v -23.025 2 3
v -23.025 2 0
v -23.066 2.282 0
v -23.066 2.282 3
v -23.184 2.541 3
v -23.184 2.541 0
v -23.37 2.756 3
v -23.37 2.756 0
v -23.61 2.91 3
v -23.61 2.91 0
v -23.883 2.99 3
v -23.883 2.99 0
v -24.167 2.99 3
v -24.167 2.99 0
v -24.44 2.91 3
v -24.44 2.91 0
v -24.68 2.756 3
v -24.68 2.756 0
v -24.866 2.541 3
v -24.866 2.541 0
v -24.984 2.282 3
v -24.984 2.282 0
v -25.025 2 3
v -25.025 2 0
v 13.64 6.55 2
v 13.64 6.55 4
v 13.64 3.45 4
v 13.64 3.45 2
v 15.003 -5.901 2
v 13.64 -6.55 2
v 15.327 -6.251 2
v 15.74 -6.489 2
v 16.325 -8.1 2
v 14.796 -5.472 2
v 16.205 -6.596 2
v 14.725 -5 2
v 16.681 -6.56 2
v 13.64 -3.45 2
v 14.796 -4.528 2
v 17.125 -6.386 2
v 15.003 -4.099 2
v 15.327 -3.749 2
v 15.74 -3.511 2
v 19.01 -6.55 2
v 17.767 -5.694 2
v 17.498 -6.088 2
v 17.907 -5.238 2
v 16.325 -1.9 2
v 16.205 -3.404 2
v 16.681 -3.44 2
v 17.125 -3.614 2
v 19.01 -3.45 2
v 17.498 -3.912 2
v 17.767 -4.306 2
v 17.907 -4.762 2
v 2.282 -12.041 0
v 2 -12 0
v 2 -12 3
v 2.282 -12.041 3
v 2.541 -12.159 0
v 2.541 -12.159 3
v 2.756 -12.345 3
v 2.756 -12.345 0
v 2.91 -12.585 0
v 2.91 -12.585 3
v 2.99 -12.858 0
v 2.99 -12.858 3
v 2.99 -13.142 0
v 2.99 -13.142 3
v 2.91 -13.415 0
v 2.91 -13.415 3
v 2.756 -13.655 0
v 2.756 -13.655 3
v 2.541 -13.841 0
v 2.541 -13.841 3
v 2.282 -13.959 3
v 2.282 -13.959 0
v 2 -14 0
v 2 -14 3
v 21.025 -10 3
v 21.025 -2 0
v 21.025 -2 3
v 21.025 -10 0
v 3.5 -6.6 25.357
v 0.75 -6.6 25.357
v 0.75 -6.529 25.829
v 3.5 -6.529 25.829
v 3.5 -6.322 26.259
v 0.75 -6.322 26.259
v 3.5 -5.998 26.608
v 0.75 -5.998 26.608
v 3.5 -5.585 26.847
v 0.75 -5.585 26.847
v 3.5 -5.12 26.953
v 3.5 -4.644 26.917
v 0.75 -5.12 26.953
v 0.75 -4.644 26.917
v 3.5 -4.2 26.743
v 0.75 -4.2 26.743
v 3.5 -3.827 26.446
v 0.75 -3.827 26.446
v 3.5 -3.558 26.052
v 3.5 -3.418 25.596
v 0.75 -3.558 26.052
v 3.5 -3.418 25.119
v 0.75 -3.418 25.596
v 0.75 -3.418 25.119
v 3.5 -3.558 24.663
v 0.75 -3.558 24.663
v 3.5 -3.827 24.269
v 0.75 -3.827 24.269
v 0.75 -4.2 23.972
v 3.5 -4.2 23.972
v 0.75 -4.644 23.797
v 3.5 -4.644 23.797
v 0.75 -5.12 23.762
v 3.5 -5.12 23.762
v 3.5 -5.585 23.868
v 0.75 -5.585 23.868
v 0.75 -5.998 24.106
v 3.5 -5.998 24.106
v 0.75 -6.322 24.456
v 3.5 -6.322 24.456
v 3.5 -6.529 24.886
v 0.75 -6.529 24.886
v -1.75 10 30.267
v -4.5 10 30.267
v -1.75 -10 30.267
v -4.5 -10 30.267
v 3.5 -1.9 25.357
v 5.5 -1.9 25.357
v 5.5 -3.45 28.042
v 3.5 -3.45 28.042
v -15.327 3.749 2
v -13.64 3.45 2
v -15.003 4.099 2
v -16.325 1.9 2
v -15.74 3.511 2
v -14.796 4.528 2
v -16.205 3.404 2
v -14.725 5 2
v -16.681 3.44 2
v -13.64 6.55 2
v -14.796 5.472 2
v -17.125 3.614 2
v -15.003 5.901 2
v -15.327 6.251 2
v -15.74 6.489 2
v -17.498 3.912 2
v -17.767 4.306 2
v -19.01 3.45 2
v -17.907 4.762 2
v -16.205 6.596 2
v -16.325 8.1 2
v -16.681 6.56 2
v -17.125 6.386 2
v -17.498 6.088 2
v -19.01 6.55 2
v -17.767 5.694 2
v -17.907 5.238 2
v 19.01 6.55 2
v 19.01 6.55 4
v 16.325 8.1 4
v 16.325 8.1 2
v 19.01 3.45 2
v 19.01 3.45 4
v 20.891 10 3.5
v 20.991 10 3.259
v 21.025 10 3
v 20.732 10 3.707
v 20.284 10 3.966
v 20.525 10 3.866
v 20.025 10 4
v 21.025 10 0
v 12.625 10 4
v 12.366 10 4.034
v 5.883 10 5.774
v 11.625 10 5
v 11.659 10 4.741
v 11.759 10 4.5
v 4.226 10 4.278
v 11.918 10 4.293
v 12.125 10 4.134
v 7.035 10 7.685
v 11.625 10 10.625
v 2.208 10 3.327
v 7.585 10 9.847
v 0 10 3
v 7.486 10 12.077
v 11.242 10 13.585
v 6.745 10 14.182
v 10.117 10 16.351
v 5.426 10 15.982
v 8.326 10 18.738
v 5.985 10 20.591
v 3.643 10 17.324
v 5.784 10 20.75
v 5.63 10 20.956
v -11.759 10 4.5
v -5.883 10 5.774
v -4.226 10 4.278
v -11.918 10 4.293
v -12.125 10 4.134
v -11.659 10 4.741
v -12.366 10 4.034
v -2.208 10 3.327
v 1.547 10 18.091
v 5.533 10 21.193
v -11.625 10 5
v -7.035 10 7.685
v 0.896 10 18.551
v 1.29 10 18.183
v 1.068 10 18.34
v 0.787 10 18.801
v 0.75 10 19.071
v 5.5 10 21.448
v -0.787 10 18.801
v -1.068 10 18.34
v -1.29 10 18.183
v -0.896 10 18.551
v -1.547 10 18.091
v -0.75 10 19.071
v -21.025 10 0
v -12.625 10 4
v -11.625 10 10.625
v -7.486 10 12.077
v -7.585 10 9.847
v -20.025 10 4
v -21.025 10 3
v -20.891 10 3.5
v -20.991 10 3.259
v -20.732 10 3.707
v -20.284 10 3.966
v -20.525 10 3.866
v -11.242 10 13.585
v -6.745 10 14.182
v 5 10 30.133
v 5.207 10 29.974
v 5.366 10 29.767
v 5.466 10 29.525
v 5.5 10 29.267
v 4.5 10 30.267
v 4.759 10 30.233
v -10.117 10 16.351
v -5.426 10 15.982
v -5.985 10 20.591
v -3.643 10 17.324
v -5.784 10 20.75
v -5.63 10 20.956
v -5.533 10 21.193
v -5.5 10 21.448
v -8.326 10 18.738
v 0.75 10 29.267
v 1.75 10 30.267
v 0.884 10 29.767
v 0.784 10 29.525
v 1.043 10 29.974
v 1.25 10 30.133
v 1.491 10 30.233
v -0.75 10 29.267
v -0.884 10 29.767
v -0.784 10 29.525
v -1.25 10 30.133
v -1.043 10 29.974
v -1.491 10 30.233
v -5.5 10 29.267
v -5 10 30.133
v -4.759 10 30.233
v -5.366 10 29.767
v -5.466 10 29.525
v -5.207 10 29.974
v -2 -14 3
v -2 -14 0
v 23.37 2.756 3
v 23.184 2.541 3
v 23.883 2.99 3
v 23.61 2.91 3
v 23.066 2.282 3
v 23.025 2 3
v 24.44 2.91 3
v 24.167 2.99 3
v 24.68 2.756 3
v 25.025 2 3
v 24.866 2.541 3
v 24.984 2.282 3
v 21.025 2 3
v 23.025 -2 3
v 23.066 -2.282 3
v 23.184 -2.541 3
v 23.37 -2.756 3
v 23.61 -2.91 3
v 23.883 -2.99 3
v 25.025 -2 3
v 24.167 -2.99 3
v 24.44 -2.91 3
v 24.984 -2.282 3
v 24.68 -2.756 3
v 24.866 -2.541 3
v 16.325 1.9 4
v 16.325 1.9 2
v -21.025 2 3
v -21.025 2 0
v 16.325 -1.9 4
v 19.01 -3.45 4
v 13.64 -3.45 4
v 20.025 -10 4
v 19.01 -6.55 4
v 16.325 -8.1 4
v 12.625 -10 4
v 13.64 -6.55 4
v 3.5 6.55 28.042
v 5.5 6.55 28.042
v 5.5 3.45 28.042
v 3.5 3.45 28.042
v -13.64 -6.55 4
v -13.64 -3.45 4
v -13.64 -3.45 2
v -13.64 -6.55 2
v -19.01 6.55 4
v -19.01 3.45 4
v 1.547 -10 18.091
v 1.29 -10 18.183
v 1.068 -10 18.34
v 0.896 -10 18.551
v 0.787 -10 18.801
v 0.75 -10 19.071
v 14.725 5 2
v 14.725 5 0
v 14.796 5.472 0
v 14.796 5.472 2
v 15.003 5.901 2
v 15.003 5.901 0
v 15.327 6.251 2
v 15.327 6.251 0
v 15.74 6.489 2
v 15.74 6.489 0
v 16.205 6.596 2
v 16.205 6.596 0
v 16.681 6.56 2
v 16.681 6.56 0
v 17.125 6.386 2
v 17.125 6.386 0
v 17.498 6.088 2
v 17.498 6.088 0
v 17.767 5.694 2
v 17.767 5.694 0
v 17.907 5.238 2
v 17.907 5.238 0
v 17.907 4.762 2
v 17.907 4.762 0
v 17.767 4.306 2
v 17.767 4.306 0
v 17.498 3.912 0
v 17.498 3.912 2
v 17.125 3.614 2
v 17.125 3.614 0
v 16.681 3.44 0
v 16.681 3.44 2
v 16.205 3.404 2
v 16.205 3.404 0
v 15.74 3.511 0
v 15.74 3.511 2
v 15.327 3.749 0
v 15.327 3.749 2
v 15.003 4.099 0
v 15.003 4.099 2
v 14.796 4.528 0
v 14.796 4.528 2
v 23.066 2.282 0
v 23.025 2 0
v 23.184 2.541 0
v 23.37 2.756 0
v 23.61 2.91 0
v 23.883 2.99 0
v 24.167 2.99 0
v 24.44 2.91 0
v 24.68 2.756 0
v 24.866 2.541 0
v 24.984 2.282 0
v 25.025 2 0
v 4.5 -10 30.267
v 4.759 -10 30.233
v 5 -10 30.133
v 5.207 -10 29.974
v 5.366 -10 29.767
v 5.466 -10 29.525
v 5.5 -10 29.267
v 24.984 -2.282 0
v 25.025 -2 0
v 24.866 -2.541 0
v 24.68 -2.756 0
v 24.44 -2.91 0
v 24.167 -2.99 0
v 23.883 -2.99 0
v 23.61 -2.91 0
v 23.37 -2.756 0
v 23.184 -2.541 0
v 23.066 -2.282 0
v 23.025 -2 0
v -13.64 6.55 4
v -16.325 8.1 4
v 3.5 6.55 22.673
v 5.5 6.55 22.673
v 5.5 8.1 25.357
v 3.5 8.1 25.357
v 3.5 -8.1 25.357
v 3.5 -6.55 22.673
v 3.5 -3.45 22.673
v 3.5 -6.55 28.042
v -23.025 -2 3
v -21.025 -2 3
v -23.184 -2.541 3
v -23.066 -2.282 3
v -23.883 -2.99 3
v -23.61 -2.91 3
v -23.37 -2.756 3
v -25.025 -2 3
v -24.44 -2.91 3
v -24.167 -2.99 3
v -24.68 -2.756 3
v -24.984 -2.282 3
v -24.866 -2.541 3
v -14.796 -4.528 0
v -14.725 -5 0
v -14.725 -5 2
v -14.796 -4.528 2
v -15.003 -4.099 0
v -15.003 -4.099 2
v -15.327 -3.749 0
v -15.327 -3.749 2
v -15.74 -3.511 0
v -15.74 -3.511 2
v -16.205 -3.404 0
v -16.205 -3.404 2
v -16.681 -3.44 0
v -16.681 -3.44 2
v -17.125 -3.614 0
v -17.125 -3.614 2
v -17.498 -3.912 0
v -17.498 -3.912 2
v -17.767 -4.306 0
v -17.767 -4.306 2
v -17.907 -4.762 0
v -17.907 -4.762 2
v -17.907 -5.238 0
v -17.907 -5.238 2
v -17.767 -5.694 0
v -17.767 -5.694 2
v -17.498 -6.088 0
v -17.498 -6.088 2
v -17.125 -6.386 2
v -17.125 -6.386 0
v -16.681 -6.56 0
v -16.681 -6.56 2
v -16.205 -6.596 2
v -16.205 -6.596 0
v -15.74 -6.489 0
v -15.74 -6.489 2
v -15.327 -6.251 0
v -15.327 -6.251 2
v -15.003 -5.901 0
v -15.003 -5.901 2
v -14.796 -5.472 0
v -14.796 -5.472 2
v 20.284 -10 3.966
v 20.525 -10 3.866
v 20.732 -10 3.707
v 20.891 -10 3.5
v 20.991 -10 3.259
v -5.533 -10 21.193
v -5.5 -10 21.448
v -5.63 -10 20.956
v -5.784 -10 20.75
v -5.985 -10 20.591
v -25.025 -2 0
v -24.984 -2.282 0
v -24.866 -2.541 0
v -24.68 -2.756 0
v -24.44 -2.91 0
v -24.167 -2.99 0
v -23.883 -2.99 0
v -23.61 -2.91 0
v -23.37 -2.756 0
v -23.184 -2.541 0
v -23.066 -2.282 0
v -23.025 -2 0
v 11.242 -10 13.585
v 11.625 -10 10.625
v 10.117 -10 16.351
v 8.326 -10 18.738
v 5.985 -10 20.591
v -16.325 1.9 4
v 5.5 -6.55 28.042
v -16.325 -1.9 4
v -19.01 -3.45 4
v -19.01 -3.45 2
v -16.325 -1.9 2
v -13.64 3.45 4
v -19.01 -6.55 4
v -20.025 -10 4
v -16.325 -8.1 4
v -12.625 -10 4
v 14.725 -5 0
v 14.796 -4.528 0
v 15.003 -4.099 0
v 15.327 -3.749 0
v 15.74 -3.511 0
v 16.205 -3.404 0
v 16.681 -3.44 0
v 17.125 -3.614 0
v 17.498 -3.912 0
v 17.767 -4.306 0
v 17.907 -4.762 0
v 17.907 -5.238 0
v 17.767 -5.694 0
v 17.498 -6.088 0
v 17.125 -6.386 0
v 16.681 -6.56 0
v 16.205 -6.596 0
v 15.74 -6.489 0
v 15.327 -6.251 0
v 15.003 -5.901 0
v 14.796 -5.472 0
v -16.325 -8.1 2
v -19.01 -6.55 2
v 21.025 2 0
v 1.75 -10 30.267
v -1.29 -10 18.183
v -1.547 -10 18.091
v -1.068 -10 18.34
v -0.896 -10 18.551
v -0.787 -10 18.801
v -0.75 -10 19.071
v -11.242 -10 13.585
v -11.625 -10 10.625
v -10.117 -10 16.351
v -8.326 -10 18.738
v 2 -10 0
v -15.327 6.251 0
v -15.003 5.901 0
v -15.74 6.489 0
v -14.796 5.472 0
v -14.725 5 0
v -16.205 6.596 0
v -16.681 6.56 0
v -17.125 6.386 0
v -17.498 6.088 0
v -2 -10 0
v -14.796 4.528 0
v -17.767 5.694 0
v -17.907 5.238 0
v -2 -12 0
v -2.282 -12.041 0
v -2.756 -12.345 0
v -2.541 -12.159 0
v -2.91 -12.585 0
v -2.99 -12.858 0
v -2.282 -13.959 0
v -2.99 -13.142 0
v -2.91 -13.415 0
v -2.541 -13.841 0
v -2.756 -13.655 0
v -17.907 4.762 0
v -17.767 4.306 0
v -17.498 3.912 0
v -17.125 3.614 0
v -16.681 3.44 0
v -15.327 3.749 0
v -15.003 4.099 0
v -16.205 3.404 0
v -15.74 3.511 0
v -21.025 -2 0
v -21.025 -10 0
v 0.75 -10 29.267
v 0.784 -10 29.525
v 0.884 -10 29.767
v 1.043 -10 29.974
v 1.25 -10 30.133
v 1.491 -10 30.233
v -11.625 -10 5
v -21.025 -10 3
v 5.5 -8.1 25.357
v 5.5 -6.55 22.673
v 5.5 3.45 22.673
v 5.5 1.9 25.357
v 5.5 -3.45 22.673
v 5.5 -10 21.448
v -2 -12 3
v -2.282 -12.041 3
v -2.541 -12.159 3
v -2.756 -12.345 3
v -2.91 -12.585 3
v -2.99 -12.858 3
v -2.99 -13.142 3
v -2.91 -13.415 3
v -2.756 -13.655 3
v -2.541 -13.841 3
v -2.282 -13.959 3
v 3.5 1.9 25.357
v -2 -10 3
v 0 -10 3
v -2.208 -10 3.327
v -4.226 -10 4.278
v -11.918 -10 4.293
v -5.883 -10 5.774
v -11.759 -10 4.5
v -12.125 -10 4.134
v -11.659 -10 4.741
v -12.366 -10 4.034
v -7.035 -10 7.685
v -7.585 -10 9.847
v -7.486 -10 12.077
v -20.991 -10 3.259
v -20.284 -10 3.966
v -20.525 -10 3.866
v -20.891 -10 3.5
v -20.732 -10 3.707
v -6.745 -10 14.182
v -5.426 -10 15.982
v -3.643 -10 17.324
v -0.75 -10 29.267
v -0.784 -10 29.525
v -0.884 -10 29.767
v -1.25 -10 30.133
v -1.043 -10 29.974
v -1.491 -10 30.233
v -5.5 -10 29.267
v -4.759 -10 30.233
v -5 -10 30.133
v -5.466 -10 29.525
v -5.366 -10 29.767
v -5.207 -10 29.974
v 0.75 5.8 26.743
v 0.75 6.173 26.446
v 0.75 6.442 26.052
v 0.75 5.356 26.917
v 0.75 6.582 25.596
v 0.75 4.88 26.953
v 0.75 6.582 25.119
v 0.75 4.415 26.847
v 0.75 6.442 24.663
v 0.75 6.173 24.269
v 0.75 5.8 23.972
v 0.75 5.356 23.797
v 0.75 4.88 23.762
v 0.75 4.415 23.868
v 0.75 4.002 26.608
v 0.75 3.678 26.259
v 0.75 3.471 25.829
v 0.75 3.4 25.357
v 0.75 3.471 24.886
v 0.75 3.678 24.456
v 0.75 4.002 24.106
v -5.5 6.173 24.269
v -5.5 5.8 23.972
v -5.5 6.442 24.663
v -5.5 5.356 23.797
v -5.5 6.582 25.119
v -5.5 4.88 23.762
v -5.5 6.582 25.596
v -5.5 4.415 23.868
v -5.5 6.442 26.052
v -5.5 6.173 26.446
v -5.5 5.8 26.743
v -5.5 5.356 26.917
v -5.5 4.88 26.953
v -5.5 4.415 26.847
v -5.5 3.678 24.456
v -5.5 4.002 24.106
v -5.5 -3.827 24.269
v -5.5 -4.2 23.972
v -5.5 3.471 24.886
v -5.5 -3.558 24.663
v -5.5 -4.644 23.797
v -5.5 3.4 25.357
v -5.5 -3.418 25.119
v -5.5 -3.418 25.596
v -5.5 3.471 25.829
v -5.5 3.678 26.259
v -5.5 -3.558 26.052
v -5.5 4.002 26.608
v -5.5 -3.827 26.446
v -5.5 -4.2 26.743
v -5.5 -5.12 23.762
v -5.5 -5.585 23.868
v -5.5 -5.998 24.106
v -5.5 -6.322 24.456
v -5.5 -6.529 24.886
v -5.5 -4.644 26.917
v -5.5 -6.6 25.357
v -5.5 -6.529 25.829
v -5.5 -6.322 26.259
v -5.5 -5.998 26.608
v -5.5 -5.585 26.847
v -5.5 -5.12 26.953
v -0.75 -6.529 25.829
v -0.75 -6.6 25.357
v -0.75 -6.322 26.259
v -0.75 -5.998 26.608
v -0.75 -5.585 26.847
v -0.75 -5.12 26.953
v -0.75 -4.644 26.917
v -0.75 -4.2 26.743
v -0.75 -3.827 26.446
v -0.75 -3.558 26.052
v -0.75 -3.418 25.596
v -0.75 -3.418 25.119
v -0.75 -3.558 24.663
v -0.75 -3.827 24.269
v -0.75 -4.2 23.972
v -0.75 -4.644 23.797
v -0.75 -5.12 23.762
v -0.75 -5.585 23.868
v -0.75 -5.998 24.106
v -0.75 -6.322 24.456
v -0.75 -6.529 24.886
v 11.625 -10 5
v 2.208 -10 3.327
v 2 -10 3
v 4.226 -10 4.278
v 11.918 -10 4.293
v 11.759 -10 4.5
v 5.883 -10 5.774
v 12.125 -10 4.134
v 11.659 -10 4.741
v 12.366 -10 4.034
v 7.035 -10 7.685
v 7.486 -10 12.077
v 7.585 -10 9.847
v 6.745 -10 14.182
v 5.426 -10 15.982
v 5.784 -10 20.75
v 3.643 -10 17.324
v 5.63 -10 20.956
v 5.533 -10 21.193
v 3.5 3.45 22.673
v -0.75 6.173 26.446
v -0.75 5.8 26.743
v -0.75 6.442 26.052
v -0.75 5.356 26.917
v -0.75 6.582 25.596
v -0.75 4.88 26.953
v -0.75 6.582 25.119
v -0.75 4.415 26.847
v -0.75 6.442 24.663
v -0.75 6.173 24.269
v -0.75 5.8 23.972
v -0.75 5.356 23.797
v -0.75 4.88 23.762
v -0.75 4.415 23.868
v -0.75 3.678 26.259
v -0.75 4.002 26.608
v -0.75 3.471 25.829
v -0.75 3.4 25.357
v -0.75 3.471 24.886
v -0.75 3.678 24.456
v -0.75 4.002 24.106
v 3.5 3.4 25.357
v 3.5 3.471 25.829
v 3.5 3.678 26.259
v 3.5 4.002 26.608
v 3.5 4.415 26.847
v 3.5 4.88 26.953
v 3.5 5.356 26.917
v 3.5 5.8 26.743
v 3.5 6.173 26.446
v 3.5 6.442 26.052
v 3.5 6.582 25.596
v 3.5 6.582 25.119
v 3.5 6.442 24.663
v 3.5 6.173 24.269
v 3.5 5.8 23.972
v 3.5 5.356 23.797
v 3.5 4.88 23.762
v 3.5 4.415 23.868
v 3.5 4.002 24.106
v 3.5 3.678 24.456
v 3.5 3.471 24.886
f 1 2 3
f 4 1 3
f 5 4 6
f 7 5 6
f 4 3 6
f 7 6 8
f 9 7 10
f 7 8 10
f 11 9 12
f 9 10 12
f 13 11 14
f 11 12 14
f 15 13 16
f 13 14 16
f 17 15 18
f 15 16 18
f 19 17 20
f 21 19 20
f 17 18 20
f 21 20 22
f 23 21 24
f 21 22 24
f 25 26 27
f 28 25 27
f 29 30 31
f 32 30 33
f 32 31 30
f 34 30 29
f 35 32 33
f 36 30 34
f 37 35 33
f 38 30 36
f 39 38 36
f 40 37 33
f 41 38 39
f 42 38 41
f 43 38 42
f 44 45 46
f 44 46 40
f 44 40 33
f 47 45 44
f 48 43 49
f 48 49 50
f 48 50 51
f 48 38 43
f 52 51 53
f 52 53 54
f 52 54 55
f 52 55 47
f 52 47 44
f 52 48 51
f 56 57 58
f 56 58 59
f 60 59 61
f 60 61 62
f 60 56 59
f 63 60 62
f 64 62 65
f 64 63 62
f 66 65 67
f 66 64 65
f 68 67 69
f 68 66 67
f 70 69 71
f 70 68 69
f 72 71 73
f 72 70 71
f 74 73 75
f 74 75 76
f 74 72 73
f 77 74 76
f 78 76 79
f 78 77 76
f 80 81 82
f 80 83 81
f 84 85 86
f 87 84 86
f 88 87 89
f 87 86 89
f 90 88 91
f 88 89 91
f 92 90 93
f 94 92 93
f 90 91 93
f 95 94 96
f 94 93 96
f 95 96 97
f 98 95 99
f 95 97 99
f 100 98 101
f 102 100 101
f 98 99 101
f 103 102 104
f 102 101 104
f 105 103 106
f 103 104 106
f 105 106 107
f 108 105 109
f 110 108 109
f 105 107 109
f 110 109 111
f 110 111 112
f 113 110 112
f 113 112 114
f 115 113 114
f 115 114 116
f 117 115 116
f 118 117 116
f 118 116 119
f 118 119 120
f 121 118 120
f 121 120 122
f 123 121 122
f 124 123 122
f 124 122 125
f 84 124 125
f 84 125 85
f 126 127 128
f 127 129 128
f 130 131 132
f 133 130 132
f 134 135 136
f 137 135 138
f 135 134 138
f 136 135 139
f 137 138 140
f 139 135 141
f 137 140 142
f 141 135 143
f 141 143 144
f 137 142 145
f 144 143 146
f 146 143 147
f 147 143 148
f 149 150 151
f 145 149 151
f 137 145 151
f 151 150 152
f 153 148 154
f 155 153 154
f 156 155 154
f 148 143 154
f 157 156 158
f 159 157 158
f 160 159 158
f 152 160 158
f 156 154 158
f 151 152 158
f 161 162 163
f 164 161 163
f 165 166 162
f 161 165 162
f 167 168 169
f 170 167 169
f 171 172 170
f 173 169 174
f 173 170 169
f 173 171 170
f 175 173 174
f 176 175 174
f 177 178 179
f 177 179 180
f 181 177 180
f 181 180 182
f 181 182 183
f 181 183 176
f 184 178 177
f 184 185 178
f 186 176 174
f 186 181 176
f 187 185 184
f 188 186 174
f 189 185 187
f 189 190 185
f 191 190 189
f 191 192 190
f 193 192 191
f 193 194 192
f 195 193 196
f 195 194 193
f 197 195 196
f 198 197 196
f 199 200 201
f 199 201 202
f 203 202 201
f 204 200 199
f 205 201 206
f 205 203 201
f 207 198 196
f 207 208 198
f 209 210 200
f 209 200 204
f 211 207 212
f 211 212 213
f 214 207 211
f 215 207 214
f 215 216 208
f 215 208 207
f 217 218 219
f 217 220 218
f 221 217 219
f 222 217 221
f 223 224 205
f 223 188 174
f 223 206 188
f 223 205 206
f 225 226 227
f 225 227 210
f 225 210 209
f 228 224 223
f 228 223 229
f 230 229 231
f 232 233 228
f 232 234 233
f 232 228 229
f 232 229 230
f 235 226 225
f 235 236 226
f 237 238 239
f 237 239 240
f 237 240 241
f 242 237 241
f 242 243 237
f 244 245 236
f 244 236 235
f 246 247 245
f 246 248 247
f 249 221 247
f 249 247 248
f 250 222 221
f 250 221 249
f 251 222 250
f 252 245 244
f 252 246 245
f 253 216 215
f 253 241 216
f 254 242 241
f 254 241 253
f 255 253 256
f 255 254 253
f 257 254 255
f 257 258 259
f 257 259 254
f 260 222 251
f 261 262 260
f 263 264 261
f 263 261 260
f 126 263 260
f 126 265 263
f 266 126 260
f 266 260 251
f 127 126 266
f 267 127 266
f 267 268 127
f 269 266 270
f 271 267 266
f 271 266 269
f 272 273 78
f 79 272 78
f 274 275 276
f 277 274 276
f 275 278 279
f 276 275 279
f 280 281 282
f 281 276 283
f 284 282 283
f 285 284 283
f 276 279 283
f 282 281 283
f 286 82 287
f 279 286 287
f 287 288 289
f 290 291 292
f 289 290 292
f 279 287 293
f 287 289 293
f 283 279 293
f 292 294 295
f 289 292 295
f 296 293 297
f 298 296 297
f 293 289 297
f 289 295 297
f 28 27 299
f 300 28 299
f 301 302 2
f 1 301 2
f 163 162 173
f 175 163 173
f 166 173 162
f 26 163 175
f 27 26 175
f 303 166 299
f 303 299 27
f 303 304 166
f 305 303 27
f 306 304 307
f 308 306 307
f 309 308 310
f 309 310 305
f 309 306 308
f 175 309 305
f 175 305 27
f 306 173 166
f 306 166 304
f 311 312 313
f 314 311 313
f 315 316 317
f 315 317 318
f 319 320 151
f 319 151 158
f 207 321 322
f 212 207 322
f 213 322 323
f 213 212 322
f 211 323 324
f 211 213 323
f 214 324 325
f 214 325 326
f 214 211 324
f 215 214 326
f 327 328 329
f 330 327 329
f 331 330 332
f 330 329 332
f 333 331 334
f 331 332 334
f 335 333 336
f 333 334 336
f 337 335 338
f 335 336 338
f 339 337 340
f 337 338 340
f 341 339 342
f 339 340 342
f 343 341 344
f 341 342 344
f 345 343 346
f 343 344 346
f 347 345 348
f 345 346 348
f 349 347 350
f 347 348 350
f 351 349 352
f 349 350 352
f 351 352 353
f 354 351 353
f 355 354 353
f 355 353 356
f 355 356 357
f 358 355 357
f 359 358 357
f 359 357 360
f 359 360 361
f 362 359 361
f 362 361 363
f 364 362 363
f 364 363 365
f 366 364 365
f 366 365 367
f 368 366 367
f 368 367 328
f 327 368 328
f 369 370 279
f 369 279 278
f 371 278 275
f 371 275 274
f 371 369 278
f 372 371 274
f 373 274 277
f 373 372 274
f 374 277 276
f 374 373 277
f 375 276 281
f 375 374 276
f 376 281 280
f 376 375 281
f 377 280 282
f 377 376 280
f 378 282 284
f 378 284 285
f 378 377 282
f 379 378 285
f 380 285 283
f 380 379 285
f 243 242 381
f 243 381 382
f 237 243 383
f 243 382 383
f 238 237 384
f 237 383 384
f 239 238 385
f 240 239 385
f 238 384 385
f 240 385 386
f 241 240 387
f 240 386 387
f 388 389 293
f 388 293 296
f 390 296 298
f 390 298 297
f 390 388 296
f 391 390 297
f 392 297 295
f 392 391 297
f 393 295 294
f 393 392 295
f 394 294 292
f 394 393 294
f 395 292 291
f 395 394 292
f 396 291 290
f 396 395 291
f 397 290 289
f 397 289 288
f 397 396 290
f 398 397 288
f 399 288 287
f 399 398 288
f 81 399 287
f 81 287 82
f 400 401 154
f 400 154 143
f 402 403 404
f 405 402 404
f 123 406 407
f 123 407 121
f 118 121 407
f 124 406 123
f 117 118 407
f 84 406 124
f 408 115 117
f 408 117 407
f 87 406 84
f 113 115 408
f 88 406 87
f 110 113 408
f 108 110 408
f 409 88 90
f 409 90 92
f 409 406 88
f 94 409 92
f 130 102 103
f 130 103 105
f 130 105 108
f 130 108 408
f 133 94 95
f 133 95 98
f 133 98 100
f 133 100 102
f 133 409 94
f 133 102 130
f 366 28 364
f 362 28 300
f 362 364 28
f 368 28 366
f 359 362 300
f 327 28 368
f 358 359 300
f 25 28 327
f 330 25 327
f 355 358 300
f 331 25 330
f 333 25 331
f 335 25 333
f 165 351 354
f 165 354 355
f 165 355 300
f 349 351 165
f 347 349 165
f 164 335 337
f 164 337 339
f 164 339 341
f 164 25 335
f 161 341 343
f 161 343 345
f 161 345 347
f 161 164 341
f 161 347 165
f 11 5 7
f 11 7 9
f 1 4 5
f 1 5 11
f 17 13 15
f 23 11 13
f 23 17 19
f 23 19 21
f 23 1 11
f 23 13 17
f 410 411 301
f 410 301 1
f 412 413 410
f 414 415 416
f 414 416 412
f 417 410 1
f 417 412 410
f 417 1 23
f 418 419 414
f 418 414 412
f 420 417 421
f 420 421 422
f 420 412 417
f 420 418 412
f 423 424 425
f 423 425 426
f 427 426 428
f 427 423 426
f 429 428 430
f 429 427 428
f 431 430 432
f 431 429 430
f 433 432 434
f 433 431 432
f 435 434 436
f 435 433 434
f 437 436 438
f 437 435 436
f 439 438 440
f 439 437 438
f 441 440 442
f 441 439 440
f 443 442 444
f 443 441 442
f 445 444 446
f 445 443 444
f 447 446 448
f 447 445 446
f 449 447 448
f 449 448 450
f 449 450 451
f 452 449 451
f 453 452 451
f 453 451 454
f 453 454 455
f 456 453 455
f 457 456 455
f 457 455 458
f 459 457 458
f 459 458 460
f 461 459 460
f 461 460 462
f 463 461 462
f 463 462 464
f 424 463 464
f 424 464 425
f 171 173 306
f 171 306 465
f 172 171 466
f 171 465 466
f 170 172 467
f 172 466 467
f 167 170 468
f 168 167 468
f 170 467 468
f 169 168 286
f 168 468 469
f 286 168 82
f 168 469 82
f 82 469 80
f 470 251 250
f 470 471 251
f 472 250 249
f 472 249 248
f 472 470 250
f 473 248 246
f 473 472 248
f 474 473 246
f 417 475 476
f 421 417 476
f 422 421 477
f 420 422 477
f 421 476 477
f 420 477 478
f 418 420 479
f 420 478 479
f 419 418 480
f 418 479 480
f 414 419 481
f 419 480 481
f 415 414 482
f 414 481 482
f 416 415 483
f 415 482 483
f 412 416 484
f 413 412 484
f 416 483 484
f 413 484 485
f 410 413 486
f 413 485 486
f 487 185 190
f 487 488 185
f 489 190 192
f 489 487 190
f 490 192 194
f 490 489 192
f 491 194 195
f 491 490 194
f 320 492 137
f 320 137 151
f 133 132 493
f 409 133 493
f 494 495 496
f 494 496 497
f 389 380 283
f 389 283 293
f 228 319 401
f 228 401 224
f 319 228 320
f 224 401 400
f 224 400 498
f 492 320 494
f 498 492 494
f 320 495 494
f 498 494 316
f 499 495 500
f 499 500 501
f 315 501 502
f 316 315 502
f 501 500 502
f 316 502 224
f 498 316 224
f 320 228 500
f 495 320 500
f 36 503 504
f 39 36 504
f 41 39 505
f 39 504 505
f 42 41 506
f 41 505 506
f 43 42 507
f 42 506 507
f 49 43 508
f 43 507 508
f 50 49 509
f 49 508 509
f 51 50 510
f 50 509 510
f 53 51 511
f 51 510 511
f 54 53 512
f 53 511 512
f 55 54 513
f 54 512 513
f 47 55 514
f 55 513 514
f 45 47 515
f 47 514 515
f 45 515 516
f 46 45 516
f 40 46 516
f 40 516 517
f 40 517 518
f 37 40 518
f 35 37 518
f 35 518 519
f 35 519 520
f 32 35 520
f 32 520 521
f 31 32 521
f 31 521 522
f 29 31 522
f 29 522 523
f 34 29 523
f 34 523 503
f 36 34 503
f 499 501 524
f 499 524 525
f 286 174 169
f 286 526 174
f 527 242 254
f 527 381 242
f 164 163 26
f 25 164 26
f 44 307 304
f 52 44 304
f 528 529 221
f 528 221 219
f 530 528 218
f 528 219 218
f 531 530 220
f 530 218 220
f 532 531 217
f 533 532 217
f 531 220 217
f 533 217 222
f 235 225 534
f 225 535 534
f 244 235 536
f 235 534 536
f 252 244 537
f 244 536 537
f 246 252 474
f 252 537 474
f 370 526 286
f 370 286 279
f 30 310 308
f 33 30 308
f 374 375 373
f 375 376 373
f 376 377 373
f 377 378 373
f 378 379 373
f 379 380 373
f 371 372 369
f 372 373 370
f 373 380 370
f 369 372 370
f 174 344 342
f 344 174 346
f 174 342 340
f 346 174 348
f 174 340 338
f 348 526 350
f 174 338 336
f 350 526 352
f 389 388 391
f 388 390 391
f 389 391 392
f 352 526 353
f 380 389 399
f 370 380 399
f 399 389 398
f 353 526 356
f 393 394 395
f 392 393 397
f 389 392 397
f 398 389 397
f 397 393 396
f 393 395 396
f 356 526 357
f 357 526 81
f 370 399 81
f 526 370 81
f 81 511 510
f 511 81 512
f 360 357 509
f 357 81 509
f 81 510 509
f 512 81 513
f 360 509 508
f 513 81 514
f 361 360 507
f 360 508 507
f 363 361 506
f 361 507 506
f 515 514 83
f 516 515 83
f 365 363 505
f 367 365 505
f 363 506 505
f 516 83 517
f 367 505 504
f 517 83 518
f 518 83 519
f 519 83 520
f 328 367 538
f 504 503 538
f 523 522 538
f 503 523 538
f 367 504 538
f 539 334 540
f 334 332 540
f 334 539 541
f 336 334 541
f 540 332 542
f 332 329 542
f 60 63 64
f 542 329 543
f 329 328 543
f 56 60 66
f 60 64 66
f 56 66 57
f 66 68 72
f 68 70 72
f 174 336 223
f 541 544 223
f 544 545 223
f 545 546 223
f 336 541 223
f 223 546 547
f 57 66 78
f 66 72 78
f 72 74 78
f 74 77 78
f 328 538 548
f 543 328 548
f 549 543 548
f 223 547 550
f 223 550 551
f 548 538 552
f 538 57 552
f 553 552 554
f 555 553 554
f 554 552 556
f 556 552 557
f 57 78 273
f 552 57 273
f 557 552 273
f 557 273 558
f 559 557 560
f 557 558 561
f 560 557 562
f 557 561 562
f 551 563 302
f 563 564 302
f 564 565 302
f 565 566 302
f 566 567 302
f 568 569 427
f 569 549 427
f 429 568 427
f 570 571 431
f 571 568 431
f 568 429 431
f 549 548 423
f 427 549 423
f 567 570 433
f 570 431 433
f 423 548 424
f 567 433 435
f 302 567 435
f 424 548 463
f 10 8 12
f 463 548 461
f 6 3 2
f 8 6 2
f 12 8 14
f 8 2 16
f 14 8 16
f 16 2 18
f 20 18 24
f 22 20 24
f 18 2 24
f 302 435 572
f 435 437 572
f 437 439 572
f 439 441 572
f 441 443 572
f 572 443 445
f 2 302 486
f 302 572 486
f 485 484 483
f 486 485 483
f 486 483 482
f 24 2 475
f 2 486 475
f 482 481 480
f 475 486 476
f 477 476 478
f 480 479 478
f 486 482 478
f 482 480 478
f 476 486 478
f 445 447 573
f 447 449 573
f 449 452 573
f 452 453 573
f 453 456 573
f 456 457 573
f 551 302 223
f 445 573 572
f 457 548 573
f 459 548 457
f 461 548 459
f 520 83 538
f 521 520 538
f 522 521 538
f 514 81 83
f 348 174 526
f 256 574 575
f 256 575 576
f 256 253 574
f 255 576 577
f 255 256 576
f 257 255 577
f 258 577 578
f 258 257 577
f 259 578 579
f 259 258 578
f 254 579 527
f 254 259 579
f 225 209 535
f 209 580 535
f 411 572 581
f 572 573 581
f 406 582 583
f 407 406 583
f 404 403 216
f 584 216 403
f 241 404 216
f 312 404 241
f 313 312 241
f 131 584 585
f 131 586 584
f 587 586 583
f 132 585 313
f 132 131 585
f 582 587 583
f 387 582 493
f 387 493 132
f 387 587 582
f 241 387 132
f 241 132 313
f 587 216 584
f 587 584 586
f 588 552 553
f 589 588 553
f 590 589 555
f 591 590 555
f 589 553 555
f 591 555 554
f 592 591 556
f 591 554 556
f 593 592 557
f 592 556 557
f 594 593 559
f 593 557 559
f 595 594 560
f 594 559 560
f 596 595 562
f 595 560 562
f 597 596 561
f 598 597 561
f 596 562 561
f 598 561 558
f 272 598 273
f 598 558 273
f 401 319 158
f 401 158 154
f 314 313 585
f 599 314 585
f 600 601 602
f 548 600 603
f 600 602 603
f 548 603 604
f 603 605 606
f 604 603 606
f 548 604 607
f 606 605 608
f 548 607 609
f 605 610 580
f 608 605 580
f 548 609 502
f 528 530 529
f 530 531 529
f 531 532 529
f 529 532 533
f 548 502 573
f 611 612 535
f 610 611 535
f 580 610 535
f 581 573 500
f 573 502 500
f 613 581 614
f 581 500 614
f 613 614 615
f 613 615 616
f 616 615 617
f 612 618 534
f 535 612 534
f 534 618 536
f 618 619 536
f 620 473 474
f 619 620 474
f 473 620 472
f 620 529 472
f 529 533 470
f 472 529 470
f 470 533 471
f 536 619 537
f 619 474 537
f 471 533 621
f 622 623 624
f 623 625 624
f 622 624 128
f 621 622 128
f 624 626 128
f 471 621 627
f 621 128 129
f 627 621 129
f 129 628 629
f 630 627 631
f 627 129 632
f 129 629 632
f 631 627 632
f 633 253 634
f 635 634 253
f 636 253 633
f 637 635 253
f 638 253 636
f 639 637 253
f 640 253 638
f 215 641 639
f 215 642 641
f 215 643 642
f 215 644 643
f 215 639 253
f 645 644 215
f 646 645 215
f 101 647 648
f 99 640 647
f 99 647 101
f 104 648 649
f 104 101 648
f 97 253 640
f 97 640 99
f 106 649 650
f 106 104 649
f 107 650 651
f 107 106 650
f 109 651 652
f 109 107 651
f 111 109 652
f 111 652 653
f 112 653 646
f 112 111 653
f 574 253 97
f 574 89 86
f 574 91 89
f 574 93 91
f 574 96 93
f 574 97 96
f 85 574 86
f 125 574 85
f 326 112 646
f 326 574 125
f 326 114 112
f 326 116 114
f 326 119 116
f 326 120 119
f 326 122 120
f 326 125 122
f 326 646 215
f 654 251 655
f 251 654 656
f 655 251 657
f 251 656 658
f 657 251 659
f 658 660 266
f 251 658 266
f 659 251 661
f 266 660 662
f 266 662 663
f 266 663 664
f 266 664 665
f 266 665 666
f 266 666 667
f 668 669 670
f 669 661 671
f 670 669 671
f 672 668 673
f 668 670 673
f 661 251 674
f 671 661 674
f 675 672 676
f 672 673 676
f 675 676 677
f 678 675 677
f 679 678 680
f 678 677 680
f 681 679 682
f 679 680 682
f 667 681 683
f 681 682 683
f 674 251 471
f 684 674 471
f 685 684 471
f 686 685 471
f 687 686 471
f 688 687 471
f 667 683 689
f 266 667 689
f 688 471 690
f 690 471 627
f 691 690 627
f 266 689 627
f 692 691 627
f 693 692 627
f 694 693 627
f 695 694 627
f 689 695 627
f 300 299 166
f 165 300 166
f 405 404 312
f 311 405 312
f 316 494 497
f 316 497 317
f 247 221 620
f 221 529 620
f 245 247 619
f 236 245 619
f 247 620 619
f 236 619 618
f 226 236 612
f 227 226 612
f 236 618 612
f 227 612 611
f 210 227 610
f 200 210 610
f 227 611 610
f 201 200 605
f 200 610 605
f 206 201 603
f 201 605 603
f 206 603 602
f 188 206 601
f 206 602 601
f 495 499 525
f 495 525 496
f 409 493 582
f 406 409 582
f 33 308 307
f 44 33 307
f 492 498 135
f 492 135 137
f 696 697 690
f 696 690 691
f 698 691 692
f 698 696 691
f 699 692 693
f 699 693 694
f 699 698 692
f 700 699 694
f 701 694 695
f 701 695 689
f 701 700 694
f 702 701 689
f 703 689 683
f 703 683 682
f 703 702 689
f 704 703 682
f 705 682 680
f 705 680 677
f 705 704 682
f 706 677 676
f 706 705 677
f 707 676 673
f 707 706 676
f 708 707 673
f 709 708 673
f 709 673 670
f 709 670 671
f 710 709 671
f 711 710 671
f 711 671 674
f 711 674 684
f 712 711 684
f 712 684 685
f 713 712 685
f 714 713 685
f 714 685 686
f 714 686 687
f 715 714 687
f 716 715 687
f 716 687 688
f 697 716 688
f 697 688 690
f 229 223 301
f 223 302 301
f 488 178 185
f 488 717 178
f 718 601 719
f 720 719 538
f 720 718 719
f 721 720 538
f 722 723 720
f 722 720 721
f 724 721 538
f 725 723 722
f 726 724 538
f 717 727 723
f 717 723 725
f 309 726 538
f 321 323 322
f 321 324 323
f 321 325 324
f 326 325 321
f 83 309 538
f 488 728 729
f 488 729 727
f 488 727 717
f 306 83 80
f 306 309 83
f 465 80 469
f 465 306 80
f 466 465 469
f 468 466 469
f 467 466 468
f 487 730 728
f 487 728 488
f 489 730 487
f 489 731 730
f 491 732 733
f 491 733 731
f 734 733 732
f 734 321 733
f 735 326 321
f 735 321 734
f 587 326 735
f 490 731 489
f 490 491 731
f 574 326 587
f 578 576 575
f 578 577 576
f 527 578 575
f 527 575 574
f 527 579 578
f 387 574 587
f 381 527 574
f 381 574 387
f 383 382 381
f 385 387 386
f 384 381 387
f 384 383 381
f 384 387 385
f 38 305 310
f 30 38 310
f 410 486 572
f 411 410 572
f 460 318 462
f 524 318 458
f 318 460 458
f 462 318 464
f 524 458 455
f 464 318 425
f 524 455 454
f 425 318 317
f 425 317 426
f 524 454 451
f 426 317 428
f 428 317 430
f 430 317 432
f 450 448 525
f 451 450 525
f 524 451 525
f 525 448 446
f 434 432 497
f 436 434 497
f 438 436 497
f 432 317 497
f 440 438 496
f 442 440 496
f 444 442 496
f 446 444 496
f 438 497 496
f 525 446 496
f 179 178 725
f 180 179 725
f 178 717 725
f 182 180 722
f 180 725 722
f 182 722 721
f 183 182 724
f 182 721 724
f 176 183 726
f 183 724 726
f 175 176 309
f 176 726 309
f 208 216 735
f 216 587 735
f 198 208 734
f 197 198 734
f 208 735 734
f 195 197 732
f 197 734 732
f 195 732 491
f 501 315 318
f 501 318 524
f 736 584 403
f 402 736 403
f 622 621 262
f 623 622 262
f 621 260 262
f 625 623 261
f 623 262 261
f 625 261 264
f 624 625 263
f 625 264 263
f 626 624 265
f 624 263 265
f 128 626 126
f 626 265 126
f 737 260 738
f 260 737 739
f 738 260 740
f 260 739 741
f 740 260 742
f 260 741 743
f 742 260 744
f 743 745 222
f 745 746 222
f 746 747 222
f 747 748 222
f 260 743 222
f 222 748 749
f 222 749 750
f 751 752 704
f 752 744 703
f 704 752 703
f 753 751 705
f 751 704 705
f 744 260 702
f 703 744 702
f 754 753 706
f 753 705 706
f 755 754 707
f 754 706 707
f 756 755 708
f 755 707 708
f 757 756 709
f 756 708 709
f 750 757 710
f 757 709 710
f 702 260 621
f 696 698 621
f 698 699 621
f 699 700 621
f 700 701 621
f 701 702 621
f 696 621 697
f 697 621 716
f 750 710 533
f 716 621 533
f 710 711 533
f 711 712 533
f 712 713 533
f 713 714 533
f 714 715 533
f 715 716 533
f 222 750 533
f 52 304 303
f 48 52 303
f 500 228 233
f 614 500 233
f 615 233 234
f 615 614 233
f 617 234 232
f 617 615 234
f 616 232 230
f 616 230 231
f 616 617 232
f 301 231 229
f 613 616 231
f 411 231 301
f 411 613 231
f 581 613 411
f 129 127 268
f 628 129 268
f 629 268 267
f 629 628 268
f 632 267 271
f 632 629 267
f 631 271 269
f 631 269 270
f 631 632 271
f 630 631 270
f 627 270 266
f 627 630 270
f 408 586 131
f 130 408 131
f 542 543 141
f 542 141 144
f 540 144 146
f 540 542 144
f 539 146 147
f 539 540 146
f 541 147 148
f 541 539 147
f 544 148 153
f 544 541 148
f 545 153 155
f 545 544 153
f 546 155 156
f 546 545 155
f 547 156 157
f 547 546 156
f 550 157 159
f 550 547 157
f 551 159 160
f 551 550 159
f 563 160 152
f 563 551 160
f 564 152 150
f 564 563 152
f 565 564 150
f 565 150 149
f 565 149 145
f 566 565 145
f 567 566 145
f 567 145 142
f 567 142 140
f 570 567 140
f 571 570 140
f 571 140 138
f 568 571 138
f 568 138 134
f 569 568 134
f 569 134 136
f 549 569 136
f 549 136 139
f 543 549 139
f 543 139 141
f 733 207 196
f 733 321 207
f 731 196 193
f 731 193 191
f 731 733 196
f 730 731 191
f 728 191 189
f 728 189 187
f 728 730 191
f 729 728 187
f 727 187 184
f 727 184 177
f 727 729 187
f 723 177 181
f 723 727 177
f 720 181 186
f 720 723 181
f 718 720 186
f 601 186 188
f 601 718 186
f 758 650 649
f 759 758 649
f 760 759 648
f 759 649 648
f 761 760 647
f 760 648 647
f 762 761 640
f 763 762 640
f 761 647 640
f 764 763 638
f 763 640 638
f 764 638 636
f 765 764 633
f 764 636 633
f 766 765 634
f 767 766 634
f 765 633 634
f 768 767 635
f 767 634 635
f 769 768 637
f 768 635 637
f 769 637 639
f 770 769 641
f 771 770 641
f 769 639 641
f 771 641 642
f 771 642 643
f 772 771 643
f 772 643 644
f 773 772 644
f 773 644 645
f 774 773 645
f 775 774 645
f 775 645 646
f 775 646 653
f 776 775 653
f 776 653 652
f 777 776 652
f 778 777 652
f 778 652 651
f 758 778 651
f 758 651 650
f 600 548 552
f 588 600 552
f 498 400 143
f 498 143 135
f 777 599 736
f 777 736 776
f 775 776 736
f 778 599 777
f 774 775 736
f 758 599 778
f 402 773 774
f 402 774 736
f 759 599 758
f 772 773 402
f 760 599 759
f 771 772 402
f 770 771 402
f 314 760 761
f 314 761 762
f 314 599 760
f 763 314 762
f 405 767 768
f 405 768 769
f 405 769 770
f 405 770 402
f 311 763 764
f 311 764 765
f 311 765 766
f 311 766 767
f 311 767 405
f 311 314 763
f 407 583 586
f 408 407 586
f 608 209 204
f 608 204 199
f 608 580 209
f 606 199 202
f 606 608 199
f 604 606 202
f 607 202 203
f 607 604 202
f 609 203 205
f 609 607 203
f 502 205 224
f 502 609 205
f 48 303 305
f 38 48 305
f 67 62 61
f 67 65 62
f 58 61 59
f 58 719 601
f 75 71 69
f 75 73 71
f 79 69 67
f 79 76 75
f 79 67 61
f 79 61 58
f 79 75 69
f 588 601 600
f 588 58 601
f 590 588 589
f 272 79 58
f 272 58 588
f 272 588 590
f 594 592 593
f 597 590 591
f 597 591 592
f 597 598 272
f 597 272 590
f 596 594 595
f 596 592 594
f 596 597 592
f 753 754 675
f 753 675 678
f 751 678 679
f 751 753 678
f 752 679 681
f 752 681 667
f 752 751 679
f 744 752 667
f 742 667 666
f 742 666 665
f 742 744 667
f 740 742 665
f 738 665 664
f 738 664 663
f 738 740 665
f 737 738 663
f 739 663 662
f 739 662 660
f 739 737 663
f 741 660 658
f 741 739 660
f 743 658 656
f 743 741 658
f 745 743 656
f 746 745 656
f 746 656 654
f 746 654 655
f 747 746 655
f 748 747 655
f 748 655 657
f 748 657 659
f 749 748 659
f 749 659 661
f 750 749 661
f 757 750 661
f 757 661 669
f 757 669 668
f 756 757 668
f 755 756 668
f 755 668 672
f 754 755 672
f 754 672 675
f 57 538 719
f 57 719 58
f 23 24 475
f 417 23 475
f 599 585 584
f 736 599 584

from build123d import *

# Parameters (mm, degrees)
F7_DEPTH  = 10
F8_R      = 1
F10_D     = 3.2
F12_D     = 3.2
F13_DEPTH = 2
F15_DEPTH = 3
F17_DEPTH = 2


with BuildPart() as f7:
    # F6 (on Front) → F7 (new body, symmetric)
    with BuildSketch(Plane.XZ):
        with BuildLine():
            Line((0, 3), (0, 0))
            Line((0, 0), (21.025, 0))
            Line((21.025, 0), (21.025, 4))
            Line((21.025, 4), (11.625, 4))
            Line((11.625, 4), (11.625, 10.625))
            ThreePointArc((11.625, 10.625), (9.9769265057, 16.5917044924), (5.5, 20.8666124219))
            Line((5.5, 20.8666124219), (5.5, 30.2666124219))
            Line((5.5, 30.2666124219), (0.75, 30.2666124219))
            Line((0.75, 30.2666124219), (0.75, 18.2130251054))
            ThreePointArc((0.75, 18.2130251054), (7.6157506665, 10.2495445623), (0, 3))
        make_face()
    extrude(amount=F7_DEPTH, both=True)

    # F8
    f8_edges = [f7.edges().sort_by_distance(p)[0] for p in [
        (0.75, 0, 18.213025),
        (5.5, 0, 30.266612),
        (5.5, 0, 20.866612),
        (11.625, 0, 4),
        (11.625, 0, 10.625),
        (21.025, 0, 4),
        (0.75, 0, 30.266612),
    ]]
    fillet(f8_edges, radius=F8_R)

    # F10 (through all)
    with Locations(Plane.YZ.offset(5.5)):
        with Locations((-5, 25.3573823446), (5, 25.3573823446)):
            Hole(F10_D / 2)

    # F12 (through all)
    with Locations(Plane.XY.offset(4)):
        with Locations((16.325, 5), (16.325, -5)):
            Hole(F12_D / 2)

    # F11 (on face) → F13 (cut)
    with BuildSketch(Plane.XY.offset(4)):
        Polygon((16.325, 8.1), (13.6403212483, 6.55), (13.6403212483, 3.45), (16.325, 1.9), (19.0096787517, 3.45), (19.0096787517, 6.55), align=None)
        Polygon((16.325, -1.9), (13.6403212483, -3.45), (13.6403212483, -6.55), (16.325, -8.1), (19.0096787517, -6.55), (19.0096787517, -3.45), align=None)
    extrude(amount=-F13_DEPTH, mode=Mode.SUBTRACT)

    # F14 (on face) → F15 (join)
    with BuildSketch(Plane(origin=(0, 0, 0), x_dir=(1, 0, 0), z_dir=(0, 0, -1))):
        with BuildLine():
            Line((0, 14), (0, 10))
            Line((0, 10), (2, 10))
            Line((2, 10), (2, 12))
            ThreePointArc((2, 12), (3, 13), (2, 14))
            Line((2, 14), (0, 14))
        make_face()
        with BuildLine():
            Line((21.025, 2), (21.025, 0))
            Line((21.025, 0), (25.025, 0))
            Line((25.025, 0), (25.025, 2))
            ThreePointArc((25.025, 2), (24.025, 3), (23.025, 2))
            Line((23.025, 2), (21.025, 2))
        make_face()
        with BuildLine():
            Line((25.025, 0), (21.025, 0))
            Line((21.025, 0), (21.025, -2))
            Line((21.025, -2), (23.025, -2))
            ThreePointArc((23.025, -2), (24.025, -3), (25.025, -2))
            Line((25.025, -2), (25.025, 0))
        make_face()
    extrude(amount=-F15_DEPTH)

    # F16: F7 across plane


with BuildPart() as f7_1:
    add(f7.part)
    add(f7.part.mirror(Plane.YZ))

    # F9 (on face) → F17 (cut)
    with BuildSketch(Plane.YZ.offset(5.5)):
        Polygon((-1.9, 25.3573823446), (-3.45, 28.0420610963), (-6.55, 28.0420610963), (-8.1, 25.3573823446), (-6.55, 22.6727035928), (-3.45, 22.6727035928), align=None)
        Polygon((6.55, 28.0420610963), (3.45, 28.0420610963), (1.9, 25.3573823446), (3.45, 22.6727035928), (6.55, 22.6727035928), (8.1, 25.3573823446), align=None)
    extrude(amount=-F17_DEPTH, mode=Mode.SUBTRACT)


solid = f7_1.part
